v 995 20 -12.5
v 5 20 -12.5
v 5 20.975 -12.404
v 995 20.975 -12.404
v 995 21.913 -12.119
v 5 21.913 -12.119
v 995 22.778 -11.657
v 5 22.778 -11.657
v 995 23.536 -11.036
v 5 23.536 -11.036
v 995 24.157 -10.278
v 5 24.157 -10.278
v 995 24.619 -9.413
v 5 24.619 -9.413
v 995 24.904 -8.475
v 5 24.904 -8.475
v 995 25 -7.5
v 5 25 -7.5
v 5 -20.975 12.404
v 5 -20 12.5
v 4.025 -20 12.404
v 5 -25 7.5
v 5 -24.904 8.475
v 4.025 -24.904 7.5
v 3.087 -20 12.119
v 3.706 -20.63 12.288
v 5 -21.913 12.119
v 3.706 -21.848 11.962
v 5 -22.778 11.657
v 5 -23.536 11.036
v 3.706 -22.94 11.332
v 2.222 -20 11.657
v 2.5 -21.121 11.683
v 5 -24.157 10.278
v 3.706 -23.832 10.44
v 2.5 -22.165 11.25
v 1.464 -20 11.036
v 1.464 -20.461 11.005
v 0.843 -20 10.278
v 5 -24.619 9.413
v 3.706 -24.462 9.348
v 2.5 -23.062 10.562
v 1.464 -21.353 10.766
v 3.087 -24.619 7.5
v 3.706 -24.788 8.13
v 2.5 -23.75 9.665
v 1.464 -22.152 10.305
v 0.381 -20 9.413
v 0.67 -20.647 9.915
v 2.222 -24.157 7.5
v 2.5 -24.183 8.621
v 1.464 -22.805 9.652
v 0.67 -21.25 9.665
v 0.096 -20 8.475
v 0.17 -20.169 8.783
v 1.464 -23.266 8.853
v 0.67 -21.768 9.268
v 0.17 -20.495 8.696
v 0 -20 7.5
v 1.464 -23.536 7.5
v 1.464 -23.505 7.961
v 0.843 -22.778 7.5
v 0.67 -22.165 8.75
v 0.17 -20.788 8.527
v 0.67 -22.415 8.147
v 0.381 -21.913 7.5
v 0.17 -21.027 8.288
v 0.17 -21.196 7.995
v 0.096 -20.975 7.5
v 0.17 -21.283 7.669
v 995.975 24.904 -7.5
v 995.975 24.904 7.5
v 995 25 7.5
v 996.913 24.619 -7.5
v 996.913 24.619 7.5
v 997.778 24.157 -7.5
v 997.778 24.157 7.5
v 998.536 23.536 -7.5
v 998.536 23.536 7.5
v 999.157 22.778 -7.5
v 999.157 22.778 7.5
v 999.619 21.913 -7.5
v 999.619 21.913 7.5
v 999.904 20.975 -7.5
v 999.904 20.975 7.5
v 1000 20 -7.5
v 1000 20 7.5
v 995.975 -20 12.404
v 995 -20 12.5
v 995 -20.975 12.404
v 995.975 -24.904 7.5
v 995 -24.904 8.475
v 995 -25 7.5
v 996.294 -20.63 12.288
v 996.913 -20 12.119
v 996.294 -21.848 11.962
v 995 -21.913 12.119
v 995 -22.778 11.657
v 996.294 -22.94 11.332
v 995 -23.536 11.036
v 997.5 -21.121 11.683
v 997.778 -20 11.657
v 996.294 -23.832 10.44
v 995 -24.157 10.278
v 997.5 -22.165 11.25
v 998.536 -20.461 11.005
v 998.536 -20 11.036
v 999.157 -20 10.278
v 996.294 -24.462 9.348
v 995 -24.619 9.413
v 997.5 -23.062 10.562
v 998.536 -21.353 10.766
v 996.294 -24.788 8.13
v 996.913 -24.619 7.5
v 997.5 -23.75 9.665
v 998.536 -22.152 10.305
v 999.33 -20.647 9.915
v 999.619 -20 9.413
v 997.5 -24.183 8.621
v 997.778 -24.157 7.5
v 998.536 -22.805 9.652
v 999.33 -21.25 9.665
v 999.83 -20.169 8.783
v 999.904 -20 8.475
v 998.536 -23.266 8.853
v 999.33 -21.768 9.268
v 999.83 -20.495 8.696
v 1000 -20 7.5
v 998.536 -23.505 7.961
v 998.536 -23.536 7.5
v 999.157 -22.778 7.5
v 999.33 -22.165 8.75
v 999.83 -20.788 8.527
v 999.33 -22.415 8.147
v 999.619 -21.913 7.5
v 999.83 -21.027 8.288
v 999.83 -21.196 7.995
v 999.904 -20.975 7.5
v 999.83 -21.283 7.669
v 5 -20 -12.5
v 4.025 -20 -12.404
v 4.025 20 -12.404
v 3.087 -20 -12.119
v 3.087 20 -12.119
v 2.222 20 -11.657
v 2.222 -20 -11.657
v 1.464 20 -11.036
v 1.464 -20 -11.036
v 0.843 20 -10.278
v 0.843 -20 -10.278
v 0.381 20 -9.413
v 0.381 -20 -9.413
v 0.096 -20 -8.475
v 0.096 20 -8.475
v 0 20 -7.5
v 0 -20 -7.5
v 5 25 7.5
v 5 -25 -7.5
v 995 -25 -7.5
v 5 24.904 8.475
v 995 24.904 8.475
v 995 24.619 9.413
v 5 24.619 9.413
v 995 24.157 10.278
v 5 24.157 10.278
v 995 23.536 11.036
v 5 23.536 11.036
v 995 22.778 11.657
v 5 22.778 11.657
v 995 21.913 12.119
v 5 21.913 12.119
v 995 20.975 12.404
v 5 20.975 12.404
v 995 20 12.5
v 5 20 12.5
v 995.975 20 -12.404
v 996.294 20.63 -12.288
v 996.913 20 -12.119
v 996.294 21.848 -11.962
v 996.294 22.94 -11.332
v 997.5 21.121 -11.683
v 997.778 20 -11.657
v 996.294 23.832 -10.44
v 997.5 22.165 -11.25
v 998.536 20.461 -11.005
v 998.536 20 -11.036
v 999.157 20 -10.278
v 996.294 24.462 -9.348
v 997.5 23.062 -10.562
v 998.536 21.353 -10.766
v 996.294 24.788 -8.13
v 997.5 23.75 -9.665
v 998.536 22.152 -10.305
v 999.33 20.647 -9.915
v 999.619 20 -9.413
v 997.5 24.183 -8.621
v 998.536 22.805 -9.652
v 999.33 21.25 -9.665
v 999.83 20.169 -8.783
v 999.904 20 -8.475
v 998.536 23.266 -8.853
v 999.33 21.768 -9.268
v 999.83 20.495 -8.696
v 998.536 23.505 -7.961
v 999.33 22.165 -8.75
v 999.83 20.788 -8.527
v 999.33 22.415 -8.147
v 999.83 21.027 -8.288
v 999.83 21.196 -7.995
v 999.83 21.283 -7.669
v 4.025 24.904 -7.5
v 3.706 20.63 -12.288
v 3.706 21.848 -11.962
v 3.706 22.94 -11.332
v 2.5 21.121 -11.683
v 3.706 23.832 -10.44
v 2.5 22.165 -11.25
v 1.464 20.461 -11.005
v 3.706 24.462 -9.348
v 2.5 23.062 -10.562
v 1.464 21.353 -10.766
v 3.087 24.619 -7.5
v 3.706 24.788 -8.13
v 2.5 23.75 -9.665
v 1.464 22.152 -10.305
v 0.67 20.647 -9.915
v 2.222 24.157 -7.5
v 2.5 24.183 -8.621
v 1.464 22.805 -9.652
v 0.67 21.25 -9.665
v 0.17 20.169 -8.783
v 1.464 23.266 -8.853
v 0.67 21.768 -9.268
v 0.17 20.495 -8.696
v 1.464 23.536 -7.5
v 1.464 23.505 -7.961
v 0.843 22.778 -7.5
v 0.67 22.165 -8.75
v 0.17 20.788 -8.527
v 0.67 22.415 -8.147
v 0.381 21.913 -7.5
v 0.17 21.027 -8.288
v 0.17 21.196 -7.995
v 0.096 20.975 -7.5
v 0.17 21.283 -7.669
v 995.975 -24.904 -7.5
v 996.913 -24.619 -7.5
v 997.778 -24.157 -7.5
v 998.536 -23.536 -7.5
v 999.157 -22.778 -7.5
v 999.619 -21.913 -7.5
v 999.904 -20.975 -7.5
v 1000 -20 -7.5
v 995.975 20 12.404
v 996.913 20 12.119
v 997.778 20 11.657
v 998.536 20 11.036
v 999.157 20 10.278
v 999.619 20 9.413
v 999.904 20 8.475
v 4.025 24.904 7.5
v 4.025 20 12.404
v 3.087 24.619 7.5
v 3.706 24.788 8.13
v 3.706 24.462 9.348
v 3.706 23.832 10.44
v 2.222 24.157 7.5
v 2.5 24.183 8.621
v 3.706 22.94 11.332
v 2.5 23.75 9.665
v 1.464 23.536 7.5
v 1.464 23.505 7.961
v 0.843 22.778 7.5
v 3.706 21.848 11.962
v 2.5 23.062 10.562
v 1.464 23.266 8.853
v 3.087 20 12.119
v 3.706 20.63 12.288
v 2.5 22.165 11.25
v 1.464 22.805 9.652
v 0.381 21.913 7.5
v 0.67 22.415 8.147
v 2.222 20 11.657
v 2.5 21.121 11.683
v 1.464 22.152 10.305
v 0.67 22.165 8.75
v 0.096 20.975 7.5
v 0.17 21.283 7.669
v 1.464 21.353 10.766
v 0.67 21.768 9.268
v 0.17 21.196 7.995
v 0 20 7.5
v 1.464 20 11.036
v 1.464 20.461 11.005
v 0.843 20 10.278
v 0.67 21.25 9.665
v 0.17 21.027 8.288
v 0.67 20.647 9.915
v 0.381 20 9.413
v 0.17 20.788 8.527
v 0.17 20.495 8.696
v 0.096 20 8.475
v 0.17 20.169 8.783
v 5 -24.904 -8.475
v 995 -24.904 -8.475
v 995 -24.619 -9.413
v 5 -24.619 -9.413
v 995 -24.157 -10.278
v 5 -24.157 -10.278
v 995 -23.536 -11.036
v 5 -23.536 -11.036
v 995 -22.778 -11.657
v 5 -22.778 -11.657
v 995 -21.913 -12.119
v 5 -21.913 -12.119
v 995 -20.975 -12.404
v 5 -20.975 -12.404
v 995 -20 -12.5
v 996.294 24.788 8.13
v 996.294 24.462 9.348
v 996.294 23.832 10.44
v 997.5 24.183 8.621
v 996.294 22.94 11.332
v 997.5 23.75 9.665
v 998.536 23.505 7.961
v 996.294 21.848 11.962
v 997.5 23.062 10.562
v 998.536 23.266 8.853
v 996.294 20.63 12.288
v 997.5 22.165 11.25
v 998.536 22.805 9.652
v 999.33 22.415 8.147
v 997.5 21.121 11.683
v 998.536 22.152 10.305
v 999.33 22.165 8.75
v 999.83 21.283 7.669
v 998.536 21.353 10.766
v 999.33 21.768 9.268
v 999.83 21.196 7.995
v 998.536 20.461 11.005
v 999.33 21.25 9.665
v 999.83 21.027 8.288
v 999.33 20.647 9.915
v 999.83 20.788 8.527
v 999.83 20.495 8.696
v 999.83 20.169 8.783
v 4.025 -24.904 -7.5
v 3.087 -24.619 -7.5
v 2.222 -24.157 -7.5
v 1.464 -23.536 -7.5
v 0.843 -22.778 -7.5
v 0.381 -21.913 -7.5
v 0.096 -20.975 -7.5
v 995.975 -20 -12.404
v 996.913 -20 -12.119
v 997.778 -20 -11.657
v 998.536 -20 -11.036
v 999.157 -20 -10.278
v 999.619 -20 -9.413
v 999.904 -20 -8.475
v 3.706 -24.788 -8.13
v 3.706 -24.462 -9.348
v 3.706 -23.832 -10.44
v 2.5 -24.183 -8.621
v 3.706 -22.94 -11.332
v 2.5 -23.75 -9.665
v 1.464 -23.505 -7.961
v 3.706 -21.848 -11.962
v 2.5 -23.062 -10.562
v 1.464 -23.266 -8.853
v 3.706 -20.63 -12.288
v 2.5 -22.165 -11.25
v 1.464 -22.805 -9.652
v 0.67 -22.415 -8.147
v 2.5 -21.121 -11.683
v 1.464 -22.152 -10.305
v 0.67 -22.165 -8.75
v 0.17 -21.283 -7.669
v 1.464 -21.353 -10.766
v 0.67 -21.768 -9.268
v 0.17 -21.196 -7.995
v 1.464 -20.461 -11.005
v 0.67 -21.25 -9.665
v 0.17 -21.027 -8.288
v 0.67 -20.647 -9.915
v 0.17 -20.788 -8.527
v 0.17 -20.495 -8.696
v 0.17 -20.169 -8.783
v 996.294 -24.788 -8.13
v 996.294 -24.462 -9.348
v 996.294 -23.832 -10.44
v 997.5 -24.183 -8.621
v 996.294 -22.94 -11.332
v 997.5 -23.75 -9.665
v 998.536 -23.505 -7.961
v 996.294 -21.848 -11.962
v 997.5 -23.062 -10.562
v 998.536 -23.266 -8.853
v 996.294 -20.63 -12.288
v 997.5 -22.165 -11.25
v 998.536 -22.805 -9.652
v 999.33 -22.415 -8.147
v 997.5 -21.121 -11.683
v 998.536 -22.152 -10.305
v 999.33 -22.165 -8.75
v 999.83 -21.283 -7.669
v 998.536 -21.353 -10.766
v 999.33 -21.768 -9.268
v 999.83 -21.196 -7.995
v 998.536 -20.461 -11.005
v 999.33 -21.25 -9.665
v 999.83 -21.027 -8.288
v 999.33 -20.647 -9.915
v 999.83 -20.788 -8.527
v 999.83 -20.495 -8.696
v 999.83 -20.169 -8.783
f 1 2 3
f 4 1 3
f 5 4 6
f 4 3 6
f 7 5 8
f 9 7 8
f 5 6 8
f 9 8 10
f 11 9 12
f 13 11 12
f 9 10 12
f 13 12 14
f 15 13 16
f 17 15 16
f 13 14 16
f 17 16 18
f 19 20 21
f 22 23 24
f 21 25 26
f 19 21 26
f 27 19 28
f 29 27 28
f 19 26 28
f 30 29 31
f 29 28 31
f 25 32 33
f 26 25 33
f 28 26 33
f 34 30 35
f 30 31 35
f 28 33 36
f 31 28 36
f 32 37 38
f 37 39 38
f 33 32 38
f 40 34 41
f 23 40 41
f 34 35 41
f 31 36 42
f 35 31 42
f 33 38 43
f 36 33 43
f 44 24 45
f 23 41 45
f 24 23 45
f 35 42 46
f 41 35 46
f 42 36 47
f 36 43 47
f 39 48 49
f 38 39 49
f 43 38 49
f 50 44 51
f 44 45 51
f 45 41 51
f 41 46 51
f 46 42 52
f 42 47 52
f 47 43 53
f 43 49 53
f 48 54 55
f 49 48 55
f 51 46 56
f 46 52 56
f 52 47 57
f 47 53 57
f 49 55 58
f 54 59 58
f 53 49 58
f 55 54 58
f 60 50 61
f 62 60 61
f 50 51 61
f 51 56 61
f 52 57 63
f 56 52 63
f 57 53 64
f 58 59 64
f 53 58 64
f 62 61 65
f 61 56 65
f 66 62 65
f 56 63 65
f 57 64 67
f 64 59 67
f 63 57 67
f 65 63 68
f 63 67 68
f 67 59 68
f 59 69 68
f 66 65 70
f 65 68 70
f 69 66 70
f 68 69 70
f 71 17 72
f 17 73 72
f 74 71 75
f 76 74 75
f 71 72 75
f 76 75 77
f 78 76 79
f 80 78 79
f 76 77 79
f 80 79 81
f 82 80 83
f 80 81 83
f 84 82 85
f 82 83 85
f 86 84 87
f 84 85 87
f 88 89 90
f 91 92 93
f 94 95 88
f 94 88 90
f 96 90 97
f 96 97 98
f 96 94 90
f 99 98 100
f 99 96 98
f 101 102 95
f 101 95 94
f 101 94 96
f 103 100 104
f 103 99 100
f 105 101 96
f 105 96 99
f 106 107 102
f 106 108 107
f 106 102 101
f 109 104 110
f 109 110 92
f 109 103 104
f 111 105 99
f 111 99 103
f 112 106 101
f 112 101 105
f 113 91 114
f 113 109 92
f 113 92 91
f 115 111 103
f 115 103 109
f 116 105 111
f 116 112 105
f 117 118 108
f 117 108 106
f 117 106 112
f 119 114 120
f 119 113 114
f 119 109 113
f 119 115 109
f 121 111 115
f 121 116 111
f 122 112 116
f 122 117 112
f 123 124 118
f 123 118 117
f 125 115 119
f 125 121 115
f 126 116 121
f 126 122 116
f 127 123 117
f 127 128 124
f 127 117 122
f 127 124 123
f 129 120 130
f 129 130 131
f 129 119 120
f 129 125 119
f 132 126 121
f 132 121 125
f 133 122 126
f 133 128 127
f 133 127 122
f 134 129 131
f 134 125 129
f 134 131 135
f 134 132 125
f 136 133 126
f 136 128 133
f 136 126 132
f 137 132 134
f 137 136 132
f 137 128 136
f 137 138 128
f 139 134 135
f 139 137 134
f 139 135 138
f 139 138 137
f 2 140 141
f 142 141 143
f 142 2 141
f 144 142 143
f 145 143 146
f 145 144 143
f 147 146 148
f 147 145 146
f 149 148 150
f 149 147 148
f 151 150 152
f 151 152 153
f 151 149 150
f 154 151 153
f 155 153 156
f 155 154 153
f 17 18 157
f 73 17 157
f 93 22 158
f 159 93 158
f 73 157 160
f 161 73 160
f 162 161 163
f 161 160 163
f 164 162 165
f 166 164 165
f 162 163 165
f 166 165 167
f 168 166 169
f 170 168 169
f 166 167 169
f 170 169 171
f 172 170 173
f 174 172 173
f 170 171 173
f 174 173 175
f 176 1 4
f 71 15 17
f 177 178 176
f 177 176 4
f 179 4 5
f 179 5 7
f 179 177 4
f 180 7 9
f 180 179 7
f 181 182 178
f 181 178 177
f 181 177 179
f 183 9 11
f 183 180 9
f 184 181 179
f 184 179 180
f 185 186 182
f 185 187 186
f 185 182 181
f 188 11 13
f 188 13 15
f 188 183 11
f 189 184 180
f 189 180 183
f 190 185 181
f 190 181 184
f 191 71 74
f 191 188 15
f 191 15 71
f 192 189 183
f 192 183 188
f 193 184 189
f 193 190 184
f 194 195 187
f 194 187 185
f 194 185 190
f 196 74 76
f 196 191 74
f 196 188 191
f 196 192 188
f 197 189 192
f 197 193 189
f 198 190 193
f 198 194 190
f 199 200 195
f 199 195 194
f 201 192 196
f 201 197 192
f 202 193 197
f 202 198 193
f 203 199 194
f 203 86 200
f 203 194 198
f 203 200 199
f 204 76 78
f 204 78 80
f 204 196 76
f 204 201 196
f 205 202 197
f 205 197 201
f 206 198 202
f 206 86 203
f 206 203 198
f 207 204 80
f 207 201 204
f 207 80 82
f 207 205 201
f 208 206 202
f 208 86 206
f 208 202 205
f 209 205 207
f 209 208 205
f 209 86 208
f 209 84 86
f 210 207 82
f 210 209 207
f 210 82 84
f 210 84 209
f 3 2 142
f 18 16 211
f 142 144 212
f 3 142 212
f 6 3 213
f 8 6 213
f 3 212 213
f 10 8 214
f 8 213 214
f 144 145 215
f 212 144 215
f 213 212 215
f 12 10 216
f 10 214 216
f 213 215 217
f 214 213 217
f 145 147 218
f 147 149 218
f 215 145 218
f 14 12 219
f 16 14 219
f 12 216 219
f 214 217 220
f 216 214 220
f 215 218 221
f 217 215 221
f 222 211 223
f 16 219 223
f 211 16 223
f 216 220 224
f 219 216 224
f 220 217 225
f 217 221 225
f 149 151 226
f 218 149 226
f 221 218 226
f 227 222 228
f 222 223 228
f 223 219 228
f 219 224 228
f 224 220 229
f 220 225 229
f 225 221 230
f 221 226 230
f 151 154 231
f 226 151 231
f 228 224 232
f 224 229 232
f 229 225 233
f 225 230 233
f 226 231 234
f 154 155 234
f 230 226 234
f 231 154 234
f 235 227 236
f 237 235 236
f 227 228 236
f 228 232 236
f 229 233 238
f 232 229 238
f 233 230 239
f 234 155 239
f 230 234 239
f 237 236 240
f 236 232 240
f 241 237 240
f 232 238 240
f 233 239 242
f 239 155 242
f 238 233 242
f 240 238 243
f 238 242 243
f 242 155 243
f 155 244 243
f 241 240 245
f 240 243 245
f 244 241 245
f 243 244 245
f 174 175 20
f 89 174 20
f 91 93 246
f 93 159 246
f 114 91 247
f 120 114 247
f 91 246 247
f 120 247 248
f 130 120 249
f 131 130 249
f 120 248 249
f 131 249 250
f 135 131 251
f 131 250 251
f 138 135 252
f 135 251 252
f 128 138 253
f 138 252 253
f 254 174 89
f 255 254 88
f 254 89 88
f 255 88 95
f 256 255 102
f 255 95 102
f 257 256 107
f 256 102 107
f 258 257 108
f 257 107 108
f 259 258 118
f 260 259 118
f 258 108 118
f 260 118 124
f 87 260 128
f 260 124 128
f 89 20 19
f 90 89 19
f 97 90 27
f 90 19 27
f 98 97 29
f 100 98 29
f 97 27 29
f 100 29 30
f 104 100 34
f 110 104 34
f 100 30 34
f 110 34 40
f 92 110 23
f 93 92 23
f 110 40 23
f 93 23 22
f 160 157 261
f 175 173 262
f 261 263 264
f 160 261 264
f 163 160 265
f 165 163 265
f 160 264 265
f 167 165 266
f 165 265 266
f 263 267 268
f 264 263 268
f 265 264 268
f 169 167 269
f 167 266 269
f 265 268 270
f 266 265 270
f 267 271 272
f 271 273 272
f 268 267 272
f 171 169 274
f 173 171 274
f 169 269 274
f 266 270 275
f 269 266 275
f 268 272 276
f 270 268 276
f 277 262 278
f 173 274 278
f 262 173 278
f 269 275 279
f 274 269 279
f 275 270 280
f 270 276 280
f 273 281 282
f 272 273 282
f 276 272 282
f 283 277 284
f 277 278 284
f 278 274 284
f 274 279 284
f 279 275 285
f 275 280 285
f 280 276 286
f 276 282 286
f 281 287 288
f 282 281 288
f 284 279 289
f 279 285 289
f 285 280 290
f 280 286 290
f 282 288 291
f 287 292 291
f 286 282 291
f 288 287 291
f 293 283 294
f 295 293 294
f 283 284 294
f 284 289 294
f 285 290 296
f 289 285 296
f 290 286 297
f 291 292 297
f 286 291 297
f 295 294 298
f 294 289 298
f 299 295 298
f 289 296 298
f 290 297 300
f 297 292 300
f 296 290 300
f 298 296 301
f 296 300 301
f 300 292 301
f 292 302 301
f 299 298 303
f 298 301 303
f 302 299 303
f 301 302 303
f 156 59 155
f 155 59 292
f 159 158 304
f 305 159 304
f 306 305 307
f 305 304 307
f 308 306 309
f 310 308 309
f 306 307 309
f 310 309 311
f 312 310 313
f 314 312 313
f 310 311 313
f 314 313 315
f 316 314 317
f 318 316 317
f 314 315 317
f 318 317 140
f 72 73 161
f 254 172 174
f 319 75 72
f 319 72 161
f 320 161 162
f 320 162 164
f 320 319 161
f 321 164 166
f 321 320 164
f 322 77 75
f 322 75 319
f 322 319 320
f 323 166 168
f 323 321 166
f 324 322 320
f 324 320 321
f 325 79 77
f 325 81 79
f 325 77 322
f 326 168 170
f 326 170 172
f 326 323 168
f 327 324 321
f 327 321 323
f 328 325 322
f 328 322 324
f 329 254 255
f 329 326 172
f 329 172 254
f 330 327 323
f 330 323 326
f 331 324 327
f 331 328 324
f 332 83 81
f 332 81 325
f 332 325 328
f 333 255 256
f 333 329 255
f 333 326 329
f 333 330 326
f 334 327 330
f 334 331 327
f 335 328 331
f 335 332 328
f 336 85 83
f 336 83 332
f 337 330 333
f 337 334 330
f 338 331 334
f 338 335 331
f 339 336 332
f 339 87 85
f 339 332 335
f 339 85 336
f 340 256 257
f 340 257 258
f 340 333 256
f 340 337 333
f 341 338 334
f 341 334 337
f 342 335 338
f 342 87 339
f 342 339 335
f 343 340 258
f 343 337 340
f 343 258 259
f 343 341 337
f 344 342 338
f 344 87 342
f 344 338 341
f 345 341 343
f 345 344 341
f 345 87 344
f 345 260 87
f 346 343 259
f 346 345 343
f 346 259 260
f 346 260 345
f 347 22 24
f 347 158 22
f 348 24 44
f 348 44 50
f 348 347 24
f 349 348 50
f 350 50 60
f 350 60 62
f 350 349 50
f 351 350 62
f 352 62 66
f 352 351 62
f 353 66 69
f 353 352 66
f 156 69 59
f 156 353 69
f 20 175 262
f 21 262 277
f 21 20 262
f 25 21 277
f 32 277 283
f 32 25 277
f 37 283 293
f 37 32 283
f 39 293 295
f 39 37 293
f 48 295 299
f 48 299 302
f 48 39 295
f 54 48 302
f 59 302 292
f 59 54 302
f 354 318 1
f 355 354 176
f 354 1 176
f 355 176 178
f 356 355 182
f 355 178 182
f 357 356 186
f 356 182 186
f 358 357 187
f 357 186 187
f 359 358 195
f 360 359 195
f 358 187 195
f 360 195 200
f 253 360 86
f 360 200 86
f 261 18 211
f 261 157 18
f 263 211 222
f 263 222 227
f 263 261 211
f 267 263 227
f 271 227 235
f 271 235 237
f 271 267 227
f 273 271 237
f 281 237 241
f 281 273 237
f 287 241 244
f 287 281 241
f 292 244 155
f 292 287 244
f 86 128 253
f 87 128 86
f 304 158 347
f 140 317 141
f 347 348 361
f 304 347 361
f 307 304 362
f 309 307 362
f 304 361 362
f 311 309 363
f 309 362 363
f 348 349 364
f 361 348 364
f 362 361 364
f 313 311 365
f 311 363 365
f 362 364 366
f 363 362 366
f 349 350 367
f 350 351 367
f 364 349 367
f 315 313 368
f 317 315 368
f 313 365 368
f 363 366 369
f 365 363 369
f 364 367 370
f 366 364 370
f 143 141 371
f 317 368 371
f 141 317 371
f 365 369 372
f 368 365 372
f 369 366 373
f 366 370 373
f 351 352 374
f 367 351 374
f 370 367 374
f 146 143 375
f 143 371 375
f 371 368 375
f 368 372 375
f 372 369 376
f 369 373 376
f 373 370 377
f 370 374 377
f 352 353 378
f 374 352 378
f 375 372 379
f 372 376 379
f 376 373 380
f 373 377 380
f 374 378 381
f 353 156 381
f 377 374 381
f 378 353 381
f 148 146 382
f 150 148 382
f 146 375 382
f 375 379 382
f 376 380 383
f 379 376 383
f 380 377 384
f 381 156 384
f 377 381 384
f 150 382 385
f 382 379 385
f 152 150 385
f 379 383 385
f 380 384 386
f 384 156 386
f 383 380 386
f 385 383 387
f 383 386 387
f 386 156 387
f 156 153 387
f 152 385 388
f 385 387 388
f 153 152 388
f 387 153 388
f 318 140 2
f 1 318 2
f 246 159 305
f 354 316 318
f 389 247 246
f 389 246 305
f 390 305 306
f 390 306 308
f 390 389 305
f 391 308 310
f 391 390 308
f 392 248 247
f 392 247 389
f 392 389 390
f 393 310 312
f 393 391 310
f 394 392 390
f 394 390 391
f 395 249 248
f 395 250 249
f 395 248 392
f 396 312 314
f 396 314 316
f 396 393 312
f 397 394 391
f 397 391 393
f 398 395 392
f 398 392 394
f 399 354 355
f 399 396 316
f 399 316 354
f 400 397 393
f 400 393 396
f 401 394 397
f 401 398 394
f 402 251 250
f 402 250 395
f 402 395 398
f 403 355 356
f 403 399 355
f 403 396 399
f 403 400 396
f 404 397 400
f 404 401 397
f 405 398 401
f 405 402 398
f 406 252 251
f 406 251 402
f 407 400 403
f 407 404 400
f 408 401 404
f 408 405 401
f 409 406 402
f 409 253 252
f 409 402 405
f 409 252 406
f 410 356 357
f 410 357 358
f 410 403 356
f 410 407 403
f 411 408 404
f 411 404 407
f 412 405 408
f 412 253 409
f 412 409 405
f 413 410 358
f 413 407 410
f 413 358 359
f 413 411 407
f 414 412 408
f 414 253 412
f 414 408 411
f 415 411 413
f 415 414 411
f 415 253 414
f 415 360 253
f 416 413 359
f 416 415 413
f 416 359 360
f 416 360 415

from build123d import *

# Parameters (mm, degrees)
F1_DEPTH = 1000
F2_R     = 5


with BuildPart() as f1:
    # F0 (on Right) → F1 (new body)
    with BuildSketch(Plane.YZ):
        with BuildLine():
            Line((-20, -12.5), (20, -12.5))
            ThreePointArc((20, -12.5), (23.5355339059, -11.0355339059), (25, -7.5))
            Line((25, -7.5), (25, 7.5))
            ThreePointArc((25, 7.5), (23.5355339059, 11.0355339059), (20, 12.5))
            Line((20, 12.5), (-20, 12.5))
            ThreePointArc((-20, 12.5), (-23.5355339059, 11.0355339059), (-25, 7.5))
            Line((-25, 7.5), (-25, -7.5))
            ThreePointArc((-25, -7.5), (-23.5355339059, -11.0355339059), (-20, -12.5))
        make_face()
    extrude(amount=F1_DEPTH)

    # F2
    f2_edges = [f1.edges().sort_by_distance(p)[0] for p in [
        (1000, -25, 0),
        (0, 25, 0),
    ]]
    fillet(f2_edges, radius=F2_R)


solid = f1.part
